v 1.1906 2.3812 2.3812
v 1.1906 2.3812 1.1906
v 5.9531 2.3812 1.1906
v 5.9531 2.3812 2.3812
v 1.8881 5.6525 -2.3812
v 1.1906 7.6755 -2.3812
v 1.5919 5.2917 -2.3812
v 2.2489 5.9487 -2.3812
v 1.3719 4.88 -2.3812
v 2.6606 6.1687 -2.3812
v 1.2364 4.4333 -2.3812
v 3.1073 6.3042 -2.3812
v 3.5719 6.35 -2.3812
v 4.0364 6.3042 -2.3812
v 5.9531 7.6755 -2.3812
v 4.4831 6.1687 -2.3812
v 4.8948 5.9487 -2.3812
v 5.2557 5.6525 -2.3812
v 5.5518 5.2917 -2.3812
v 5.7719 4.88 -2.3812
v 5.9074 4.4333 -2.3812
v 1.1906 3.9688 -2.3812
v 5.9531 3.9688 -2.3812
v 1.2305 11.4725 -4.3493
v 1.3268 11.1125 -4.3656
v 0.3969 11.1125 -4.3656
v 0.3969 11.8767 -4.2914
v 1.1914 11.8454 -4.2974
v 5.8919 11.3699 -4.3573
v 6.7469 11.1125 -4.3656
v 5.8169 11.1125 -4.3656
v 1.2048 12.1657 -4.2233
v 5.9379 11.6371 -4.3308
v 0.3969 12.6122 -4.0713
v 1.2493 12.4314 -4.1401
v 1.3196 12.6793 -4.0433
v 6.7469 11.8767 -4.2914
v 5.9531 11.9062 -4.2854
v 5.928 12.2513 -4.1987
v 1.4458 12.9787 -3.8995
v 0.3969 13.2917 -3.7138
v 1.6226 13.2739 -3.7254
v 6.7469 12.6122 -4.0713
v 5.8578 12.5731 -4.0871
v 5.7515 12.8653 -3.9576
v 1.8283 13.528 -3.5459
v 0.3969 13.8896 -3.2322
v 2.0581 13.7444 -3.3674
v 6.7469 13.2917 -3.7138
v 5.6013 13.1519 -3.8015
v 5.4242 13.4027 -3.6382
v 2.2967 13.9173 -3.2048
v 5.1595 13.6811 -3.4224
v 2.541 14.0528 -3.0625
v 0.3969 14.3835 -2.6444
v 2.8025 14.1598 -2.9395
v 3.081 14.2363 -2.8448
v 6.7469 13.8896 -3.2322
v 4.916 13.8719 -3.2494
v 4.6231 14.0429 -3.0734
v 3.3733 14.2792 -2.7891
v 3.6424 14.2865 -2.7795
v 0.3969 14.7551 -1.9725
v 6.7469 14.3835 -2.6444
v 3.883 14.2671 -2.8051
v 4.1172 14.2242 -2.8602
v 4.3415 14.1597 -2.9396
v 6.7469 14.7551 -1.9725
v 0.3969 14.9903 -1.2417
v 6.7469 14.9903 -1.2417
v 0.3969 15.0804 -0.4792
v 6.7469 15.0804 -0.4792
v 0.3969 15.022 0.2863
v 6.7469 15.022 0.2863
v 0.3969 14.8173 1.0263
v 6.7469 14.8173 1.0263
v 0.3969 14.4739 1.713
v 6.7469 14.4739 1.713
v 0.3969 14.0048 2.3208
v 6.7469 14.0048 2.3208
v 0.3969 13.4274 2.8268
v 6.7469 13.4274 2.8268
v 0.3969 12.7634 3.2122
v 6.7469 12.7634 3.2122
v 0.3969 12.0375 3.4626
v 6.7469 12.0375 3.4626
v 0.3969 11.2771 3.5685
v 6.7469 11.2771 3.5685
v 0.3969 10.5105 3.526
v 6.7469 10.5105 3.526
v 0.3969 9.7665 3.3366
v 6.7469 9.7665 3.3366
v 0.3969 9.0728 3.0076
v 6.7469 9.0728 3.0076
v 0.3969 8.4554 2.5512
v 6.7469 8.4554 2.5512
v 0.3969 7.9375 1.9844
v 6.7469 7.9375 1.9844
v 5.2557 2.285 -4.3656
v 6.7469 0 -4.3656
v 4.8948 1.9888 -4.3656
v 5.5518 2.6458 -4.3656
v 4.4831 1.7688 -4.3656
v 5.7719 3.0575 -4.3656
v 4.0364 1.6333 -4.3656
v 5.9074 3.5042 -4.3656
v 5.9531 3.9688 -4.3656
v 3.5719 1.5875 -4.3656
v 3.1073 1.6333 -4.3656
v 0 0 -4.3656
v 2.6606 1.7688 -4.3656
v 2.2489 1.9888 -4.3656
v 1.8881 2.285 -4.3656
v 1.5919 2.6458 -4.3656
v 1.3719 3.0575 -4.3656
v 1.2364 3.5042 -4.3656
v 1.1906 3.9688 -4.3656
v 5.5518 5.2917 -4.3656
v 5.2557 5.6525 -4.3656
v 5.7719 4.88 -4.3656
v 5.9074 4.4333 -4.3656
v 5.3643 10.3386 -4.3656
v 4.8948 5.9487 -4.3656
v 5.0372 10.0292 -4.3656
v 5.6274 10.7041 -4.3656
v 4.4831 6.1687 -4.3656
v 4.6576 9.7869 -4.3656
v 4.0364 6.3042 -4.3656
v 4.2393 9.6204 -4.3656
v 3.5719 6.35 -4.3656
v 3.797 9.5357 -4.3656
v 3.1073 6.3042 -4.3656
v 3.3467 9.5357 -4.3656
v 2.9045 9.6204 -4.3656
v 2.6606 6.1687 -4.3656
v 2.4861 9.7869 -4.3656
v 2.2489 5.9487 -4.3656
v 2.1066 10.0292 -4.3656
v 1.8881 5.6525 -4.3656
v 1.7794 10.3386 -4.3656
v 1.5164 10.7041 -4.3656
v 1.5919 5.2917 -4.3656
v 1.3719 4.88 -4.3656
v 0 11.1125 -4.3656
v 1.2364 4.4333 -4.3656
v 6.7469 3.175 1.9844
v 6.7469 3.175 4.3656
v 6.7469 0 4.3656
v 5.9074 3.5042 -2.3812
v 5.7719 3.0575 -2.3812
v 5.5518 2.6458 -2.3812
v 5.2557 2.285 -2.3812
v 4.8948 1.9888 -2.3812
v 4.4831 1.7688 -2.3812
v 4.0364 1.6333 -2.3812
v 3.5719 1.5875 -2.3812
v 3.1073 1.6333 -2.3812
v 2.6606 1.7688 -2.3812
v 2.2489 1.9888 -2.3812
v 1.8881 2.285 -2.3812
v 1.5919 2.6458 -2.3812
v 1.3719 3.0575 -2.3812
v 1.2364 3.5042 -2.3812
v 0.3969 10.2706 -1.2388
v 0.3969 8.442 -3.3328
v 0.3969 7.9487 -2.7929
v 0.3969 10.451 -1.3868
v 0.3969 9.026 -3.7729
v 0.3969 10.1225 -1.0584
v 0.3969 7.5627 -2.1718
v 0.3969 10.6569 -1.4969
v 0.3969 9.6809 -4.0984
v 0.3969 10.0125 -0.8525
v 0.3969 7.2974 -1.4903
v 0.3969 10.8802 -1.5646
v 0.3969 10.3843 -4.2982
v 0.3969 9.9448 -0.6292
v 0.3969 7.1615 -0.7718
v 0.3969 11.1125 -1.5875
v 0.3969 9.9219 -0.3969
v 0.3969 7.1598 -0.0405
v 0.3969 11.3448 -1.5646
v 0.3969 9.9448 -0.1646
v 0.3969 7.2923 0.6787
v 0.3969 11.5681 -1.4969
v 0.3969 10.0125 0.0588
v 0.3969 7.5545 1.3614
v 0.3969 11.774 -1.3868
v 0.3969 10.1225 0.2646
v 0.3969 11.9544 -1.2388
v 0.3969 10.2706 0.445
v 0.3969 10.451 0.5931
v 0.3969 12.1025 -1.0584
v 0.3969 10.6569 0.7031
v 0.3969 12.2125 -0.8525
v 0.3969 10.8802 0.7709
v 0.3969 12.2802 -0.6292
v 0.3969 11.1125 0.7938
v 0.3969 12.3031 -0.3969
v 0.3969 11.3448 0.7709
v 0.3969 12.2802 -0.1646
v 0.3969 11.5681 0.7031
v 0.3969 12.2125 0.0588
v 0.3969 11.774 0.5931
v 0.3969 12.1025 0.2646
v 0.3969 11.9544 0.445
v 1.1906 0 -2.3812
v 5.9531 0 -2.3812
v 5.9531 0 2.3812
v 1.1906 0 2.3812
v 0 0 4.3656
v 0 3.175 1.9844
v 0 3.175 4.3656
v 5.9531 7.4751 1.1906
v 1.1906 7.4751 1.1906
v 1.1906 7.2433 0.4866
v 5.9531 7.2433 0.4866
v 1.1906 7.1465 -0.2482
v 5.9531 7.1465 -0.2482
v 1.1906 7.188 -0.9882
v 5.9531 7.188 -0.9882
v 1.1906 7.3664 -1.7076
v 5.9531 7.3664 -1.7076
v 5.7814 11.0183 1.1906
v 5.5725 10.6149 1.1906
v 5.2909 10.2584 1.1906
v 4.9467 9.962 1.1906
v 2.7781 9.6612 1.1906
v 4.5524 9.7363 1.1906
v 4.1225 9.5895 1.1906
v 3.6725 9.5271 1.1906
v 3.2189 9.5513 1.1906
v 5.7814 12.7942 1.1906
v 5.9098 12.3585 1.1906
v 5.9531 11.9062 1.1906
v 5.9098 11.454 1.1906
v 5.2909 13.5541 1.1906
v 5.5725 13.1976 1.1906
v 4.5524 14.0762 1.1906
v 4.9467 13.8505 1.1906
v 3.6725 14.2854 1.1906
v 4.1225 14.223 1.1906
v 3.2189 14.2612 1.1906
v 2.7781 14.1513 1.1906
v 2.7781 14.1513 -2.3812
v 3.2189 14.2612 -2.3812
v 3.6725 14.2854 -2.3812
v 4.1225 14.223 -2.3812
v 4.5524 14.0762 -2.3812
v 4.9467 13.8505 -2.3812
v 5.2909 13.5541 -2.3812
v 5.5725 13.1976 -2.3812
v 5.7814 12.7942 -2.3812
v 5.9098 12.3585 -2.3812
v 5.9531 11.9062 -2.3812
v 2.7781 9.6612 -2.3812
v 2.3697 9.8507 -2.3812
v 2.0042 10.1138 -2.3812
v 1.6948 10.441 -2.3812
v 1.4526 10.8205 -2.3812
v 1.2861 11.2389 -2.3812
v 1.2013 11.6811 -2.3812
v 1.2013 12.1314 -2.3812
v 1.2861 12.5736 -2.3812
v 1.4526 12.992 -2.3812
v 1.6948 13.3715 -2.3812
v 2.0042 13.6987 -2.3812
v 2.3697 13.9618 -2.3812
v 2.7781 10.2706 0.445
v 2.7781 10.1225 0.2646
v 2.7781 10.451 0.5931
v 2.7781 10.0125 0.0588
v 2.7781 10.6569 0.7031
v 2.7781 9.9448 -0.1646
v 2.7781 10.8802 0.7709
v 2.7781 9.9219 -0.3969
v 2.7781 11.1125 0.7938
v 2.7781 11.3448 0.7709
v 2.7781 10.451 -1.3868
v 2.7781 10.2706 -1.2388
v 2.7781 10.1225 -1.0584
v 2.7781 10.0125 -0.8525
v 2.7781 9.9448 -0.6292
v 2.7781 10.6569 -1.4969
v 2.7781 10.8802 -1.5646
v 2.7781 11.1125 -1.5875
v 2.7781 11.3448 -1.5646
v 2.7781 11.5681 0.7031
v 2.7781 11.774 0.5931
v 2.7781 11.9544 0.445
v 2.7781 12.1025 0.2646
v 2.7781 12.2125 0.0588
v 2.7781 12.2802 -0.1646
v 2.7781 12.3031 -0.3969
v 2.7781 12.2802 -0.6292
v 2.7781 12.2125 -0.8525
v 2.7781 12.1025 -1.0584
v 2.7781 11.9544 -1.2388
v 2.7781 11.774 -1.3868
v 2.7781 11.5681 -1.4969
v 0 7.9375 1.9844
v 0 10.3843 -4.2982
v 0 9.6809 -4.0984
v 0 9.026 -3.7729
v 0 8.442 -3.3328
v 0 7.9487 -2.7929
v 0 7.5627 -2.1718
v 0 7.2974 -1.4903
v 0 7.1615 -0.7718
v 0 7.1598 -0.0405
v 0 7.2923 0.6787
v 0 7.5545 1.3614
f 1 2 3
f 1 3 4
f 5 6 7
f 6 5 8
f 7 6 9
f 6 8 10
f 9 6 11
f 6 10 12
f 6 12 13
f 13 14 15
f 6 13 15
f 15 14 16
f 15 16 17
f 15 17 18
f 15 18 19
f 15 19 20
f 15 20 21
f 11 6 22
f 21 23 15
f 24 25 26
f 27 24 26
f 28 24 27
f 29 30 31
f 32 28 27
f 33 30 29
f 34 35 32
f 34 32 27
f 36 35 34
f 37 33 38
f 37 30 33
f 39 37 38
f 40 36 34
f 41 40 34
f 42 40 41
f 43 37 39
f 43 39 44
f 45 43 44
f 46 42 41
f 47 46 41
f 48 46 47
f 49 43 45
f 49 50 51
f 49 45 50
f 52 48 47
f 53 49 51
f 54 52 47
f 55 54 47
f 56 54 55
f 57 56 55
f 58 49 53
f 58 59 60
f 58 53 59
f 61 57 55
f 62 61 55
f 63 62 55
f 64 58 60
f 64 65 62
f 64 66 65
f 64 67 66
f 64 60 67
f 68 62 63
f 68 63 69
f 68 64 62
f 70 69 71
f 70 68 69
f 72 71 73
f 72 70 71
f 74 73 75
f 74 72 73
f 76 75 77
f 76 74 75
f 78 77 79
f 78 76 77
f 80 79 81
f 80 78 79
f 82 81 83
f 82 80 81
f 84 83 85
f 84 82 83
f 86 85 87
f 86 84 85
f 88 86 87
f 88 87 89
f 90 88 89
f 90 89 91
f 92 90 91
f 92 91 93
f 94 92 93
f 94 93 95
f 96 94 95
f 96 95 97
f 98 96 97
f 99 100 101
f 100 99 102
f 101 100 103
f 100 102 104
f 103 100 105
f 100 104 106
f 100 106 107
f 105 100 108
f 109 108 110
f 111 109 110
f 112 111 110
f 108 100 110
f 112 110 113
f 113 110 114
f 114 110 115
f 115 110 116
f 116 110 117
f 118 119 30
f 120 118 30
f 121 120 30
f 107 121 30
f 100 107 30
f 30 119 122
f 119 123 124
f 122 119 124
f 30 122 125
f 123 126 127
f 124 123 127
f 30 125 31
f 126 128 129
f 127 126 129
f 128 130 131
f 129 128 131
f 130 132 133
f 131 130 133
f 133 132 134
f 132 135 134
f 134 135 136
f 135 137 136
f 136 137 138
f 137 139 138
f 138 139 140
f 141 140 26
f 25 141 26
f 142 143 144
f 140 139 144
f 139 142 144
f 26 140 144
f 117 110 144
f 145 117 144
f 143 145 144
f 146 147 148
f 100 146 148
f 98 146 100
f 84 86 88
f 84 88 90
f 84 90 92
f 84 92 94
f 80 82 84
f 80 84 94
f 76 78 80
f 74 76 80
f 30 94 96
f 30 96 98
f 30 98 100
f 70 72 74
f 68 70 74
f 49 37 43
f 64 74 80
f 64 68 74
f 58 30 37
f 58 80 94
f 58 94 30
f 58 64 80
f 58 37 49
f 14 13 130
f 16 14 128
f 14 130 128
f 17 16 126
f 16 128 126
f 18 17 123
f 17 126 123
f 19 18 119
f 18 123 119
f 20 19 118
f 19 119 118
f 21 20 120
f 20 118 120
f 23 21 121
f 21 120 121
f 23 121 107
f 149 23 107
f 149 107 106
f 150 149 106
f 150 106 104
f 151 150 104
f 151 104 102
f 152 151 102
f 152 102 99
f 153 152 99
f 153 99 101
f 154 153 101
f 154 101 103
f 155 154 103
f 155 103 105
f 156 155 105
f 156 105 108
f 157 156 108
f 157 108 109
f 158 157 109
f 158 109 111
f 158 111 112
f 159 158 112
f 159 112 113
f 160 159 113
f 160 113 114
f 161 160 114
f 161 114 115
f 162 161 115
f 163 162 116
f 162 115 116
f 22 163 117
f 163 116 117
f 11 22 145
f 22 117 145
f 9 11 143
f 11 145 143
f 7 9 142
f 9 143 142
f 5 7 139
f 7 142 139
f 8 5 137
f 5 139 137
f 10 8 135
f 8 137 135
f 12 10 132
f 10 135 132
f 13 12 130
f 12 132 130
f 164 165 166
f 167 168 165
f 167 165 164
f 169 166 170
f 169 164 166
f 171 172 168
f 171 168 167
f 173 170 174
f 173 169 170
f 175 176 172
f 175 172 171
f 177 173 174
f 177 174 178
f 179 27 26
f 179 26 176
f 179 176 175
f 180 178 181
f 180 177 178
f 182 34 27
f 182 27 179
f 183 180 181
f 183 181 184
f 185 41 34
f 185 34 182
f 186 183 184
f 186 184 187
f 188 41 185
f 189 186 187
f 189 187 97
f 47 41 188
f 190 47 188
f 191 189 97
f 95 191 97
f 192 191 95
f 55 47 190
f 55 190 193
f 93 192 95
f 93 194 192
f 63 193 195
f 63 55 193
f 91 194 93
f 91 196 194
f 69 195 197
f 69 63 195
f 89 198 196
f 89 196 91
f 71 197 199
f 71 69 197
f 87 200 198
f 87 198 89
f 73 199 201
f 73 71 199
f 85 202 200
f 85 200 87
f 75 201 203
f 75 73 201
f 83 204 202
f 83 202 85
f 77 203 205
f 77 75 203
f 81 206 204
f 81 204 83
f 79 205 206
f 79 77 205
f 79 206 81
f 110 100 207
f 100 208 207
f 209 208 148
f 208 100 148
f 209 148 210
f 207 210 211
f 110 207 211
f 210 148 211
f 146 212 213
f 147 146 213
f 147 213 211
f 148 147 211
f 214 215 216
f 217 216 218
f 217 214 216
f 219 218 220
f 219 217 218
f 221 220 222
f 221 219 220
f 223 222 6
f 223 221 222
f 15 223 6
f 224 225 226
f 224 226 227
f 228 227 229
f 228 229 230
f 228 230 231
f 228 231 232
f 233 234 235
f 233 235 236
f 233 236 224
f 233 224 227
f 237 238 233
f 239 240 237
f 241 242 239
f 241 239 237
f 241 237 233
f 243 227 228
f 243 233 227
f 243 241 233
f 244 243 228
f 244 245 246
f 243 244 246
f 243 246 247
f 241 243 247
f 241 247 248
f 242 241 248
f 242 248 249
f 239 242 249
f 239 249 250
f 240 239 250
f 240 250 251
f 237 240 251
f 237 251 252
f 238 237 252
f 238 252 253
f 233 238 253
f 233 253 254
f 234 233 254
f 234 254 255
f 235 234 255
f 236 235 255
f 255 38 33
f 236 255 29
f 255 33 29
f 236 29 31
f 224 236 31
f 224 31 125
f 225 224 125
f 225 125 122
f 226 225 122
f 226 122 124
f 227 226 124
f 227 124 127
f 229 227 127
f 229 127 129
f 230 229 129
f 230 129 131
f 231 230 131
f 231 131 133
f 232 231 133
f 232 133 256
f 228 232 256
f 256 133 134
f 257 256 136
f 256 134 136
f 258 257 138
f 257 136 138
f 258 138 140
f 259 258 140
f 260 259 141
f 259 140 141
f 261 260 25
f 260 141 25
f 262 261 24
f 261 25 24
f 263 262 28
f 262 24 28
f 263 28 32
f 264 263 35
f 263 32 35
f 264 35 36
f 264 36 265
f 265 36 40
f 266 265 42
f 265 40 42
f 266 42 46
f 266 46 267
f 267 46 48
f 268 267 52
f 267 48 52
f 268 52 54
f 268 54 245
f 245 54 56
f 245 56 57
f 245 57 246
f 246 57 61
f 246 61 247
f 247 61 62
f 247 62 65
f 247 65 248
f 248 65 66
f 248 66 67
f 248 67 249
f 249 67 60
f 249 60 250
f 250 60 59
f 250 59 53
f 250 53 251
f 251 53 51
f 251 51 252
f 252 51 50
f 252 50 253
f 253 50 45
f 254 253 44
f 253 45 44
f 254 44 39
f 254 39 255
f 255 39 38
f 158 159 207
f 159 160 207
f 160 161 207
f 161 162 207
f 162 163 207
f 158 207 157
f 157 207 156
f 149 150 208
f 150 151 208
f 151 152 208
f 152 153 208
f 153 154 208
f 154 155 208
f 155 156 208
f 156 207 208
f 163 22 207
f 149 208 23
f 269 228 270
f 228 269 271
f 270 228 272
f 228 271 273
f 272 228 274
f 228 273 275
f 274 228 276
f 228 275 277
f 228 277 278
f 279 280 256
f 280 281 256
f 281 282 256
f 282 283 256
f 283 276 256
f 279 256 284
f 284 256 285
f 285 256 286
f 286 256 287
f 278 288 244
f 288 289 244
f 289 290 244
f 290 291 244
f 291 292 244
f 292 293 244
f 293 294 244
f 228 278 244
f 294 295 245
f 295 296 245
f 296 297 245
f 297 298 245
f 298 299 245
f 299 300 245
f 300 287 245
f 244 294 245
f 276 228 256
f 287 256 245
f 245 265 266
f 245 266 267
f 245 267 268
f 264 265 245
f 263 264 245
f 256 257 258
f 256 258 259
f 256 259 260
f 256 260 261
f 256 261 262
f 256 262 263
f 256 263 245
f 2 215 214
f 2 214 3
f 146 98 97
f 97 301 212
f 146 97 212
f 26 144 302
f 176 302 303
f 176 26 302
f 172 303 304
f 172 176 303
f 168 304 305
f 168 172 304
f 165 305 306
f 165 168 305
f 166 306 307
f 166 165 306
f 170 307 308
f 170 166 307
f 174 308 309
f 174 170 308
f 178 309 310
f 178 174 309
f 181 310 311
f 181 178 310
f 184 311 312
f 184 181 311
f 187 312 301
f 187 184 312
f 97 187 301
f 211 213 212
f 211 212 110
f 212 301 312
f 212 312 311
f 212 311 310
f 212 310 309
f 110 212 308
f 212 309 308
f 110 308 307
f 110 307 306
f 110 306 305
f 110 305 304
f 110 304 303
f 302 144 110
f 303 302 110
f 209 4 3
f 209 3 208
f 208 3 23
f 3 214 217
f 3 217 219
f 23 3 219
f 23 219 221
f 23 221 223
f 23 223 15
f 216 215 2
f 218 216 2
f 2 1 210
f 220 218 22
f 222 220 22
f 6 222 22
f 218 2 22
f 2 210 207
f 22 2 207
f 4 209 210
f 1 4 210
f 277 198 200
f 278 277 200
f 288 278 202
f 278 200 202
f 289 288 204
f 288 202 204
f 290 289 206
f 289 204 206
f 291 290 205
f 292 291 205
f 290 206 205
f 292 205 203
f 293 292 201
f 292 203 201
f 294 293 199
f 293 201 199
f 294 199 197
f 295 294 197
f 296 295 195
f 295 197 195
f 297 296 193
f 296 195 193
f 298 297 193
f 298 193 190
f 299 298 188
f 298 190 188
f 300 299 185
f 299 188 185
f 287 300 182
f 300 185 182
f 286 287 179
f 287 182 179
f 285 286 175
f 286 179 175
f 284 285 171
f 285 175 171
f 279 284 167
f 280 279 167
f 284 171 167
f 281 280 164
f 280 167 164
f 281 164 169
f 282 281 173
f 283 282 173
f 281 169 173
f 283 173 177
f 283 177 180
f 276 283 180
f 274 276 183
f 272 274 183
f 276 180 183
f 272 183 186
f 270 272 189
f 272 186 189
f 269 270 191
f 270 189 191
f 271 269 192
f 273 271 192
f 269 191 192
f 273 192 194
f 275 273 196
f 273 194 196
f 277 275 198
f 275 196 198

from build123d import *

# Parameters (mm, degrees)
BOSS_EXTRUDE4_DEPTH  = 6.746875
SKETCH6_R            = 3.96875
BOSS_EXTRUDE5_DEPTH  = 6.746875
SHELL2_T             = -0.79375
BOSS_EXTRUDE6_REACH  = 19.089
CUT_EXTRUDE2_START   = -0.396875
SKETCH11_R           = 3.96875
CUT_EXTRUDE2_DEPTH   = 0.396875
SKETCH13_R           = 3.96875
BOSS_EXTRUDE11_DEPTH = 6.35
SKETCH14_R           = 2.38125
CUT_EXTRUDE3_DEPTH   = 1.984375
CUT_EXTRUDE4_DEPTH   = 3.571875
SKETCH17_R           = 1.190625
CUT_EXTRUDE5_DEPTH   = 2.38125


with BuildPart() as part:
    # Sketch2 → Boss-Extrude4 (new body)
    with BuildSketch(Plane(origin=(0, 0, 0), x_dir=(0, 0, -1), z_dir=(1, 0, 0))):
        Polygon((-4.365625, 0), (4.365625, 0), (4.365625, 11.1125), (-1.984375, 11.1125), (-1.984375, 3.175), (-4.365625, 3.175), align=None)
    extrude(amount=BOSS_EXTRUDE4_DEPTH)

    # Sketch6 → Boss-Extrude5 (add)
    with BuildSketch(Plane(origin=(6.746875, 0, 0), x_dir=(0, 0, -1), z_dir=(1, 0, 0))):
        with Locations((0.396875, 11.1125)):
            Circle(SKETCH6_R)
    extrude(amount=-BOSS_EXTRUDE5_DEPTH)

    # Shell2
    shell2_openings = [part.faces().sort_by_distance(p)[0] for p in [
        (3.3734375, 0, 0),
    ]]
    offset(amount=SHELL2_T, openings=shell2_openings, kind=Kind.INTERSECTION)

    # Sketch7 → Boss-Extrude6 (add, up to next)
    with BuildSketch(Plane.XZ, mode=Mode.PRIVATE) as boss_extrude6_sk1:
        Polygon((5.953125, 3.571875), (5.953125, 2.38125), (1.190625, 2.38125), (1.190625, -2.38125), (5.953125, -2.38125), (5.953125, -3.571875), (0.79375, -3.571875), (0.79375, 3.571875), align=None)
    boss_extrude6_tool1 = extrude(boss_extrude6_sk1.sketch, amount=-BOSS_EXTRUDE6_REACH, mode=Mode.PRIVATE) - part.part
    add(boss_extrude6_tool1.solids().sort_by_distance((5.865004, 0, 2.976562))[0])

    # Sketch11 → Cut-Extrude2 (cut)
    with BuildSketch(Plane.ZY.offset(CUT_EXTRUDE2_START)):
        with Locations((-0.396875, 11.1125)):
            Circle(SKETCH11_R)
    extrude(amount=CUT_EXTRUDE2_DEPTH, mode=Mode.SUBTRACT)

    # Sketch13 → Boss-Extrude11 (add)
    with BuildSketch(Plane(origin=(6.746875, 0, 0), x_dir=(0, 0, -1), z_dir=(1, 0, 0))):
        with Locations((0.396875, 11.1125)):
            Circle(SKETCH13_R)
    extrude(amount=-BOSS_EXTRUDE11_DEPTH)

    # Sketch14 → Cut-Extrude3 (cut)
    with BuildSketch(Plane(origin=(0, 0, -4.365625), x_dir=(-1, 0, 0), z_dir=(0, 0, -1))):
        with Locations(Location((-3.571875, 3.96875, 0), (0, 0, 90))):
            Circle(SKETCH14_R)
        with Locations(Location((-3.571875, 11.90625, 0), (0, 0, 180))):
            Circle(SKETCH14_R)
    extrude(amount=-CUT_EXTRUDE3_DEPTH, mode=Mode.SUBTRACT)

    # Sketch16 → Cut-Extrude4 (cut)
    with BuildSketch(Plane(origin=(0, 0, -2.38125), x_dir=(-1, 0, 0), z_dir=(0, 0, -1))):
        with BuildLine():
            Line((-2.778125, 9.66118597), (-2.778125, 14.15131403))
            ThreePointArc((-2.778125, 14.15131403), (-5.953125, 11.90625), (-2.778125, 9.66118597))
        make_face()
    extrude(amount=-CUT_EXTRUDE4_DEPTH, mode=Mode.SUBTRACT)

    # Sketch17 → Cut-Extrude5 (cut)
    with BuildSketch(Plane.ZY.offset(-0.396875)):
        with Locations((-0.396875, 11.1125)):
            Circle(SKETCH17_R)
    extrude(amount=-CUT_EXTRUDE5_DEPTH, mode=Mode.SUBTRACT)


solid = part.part
